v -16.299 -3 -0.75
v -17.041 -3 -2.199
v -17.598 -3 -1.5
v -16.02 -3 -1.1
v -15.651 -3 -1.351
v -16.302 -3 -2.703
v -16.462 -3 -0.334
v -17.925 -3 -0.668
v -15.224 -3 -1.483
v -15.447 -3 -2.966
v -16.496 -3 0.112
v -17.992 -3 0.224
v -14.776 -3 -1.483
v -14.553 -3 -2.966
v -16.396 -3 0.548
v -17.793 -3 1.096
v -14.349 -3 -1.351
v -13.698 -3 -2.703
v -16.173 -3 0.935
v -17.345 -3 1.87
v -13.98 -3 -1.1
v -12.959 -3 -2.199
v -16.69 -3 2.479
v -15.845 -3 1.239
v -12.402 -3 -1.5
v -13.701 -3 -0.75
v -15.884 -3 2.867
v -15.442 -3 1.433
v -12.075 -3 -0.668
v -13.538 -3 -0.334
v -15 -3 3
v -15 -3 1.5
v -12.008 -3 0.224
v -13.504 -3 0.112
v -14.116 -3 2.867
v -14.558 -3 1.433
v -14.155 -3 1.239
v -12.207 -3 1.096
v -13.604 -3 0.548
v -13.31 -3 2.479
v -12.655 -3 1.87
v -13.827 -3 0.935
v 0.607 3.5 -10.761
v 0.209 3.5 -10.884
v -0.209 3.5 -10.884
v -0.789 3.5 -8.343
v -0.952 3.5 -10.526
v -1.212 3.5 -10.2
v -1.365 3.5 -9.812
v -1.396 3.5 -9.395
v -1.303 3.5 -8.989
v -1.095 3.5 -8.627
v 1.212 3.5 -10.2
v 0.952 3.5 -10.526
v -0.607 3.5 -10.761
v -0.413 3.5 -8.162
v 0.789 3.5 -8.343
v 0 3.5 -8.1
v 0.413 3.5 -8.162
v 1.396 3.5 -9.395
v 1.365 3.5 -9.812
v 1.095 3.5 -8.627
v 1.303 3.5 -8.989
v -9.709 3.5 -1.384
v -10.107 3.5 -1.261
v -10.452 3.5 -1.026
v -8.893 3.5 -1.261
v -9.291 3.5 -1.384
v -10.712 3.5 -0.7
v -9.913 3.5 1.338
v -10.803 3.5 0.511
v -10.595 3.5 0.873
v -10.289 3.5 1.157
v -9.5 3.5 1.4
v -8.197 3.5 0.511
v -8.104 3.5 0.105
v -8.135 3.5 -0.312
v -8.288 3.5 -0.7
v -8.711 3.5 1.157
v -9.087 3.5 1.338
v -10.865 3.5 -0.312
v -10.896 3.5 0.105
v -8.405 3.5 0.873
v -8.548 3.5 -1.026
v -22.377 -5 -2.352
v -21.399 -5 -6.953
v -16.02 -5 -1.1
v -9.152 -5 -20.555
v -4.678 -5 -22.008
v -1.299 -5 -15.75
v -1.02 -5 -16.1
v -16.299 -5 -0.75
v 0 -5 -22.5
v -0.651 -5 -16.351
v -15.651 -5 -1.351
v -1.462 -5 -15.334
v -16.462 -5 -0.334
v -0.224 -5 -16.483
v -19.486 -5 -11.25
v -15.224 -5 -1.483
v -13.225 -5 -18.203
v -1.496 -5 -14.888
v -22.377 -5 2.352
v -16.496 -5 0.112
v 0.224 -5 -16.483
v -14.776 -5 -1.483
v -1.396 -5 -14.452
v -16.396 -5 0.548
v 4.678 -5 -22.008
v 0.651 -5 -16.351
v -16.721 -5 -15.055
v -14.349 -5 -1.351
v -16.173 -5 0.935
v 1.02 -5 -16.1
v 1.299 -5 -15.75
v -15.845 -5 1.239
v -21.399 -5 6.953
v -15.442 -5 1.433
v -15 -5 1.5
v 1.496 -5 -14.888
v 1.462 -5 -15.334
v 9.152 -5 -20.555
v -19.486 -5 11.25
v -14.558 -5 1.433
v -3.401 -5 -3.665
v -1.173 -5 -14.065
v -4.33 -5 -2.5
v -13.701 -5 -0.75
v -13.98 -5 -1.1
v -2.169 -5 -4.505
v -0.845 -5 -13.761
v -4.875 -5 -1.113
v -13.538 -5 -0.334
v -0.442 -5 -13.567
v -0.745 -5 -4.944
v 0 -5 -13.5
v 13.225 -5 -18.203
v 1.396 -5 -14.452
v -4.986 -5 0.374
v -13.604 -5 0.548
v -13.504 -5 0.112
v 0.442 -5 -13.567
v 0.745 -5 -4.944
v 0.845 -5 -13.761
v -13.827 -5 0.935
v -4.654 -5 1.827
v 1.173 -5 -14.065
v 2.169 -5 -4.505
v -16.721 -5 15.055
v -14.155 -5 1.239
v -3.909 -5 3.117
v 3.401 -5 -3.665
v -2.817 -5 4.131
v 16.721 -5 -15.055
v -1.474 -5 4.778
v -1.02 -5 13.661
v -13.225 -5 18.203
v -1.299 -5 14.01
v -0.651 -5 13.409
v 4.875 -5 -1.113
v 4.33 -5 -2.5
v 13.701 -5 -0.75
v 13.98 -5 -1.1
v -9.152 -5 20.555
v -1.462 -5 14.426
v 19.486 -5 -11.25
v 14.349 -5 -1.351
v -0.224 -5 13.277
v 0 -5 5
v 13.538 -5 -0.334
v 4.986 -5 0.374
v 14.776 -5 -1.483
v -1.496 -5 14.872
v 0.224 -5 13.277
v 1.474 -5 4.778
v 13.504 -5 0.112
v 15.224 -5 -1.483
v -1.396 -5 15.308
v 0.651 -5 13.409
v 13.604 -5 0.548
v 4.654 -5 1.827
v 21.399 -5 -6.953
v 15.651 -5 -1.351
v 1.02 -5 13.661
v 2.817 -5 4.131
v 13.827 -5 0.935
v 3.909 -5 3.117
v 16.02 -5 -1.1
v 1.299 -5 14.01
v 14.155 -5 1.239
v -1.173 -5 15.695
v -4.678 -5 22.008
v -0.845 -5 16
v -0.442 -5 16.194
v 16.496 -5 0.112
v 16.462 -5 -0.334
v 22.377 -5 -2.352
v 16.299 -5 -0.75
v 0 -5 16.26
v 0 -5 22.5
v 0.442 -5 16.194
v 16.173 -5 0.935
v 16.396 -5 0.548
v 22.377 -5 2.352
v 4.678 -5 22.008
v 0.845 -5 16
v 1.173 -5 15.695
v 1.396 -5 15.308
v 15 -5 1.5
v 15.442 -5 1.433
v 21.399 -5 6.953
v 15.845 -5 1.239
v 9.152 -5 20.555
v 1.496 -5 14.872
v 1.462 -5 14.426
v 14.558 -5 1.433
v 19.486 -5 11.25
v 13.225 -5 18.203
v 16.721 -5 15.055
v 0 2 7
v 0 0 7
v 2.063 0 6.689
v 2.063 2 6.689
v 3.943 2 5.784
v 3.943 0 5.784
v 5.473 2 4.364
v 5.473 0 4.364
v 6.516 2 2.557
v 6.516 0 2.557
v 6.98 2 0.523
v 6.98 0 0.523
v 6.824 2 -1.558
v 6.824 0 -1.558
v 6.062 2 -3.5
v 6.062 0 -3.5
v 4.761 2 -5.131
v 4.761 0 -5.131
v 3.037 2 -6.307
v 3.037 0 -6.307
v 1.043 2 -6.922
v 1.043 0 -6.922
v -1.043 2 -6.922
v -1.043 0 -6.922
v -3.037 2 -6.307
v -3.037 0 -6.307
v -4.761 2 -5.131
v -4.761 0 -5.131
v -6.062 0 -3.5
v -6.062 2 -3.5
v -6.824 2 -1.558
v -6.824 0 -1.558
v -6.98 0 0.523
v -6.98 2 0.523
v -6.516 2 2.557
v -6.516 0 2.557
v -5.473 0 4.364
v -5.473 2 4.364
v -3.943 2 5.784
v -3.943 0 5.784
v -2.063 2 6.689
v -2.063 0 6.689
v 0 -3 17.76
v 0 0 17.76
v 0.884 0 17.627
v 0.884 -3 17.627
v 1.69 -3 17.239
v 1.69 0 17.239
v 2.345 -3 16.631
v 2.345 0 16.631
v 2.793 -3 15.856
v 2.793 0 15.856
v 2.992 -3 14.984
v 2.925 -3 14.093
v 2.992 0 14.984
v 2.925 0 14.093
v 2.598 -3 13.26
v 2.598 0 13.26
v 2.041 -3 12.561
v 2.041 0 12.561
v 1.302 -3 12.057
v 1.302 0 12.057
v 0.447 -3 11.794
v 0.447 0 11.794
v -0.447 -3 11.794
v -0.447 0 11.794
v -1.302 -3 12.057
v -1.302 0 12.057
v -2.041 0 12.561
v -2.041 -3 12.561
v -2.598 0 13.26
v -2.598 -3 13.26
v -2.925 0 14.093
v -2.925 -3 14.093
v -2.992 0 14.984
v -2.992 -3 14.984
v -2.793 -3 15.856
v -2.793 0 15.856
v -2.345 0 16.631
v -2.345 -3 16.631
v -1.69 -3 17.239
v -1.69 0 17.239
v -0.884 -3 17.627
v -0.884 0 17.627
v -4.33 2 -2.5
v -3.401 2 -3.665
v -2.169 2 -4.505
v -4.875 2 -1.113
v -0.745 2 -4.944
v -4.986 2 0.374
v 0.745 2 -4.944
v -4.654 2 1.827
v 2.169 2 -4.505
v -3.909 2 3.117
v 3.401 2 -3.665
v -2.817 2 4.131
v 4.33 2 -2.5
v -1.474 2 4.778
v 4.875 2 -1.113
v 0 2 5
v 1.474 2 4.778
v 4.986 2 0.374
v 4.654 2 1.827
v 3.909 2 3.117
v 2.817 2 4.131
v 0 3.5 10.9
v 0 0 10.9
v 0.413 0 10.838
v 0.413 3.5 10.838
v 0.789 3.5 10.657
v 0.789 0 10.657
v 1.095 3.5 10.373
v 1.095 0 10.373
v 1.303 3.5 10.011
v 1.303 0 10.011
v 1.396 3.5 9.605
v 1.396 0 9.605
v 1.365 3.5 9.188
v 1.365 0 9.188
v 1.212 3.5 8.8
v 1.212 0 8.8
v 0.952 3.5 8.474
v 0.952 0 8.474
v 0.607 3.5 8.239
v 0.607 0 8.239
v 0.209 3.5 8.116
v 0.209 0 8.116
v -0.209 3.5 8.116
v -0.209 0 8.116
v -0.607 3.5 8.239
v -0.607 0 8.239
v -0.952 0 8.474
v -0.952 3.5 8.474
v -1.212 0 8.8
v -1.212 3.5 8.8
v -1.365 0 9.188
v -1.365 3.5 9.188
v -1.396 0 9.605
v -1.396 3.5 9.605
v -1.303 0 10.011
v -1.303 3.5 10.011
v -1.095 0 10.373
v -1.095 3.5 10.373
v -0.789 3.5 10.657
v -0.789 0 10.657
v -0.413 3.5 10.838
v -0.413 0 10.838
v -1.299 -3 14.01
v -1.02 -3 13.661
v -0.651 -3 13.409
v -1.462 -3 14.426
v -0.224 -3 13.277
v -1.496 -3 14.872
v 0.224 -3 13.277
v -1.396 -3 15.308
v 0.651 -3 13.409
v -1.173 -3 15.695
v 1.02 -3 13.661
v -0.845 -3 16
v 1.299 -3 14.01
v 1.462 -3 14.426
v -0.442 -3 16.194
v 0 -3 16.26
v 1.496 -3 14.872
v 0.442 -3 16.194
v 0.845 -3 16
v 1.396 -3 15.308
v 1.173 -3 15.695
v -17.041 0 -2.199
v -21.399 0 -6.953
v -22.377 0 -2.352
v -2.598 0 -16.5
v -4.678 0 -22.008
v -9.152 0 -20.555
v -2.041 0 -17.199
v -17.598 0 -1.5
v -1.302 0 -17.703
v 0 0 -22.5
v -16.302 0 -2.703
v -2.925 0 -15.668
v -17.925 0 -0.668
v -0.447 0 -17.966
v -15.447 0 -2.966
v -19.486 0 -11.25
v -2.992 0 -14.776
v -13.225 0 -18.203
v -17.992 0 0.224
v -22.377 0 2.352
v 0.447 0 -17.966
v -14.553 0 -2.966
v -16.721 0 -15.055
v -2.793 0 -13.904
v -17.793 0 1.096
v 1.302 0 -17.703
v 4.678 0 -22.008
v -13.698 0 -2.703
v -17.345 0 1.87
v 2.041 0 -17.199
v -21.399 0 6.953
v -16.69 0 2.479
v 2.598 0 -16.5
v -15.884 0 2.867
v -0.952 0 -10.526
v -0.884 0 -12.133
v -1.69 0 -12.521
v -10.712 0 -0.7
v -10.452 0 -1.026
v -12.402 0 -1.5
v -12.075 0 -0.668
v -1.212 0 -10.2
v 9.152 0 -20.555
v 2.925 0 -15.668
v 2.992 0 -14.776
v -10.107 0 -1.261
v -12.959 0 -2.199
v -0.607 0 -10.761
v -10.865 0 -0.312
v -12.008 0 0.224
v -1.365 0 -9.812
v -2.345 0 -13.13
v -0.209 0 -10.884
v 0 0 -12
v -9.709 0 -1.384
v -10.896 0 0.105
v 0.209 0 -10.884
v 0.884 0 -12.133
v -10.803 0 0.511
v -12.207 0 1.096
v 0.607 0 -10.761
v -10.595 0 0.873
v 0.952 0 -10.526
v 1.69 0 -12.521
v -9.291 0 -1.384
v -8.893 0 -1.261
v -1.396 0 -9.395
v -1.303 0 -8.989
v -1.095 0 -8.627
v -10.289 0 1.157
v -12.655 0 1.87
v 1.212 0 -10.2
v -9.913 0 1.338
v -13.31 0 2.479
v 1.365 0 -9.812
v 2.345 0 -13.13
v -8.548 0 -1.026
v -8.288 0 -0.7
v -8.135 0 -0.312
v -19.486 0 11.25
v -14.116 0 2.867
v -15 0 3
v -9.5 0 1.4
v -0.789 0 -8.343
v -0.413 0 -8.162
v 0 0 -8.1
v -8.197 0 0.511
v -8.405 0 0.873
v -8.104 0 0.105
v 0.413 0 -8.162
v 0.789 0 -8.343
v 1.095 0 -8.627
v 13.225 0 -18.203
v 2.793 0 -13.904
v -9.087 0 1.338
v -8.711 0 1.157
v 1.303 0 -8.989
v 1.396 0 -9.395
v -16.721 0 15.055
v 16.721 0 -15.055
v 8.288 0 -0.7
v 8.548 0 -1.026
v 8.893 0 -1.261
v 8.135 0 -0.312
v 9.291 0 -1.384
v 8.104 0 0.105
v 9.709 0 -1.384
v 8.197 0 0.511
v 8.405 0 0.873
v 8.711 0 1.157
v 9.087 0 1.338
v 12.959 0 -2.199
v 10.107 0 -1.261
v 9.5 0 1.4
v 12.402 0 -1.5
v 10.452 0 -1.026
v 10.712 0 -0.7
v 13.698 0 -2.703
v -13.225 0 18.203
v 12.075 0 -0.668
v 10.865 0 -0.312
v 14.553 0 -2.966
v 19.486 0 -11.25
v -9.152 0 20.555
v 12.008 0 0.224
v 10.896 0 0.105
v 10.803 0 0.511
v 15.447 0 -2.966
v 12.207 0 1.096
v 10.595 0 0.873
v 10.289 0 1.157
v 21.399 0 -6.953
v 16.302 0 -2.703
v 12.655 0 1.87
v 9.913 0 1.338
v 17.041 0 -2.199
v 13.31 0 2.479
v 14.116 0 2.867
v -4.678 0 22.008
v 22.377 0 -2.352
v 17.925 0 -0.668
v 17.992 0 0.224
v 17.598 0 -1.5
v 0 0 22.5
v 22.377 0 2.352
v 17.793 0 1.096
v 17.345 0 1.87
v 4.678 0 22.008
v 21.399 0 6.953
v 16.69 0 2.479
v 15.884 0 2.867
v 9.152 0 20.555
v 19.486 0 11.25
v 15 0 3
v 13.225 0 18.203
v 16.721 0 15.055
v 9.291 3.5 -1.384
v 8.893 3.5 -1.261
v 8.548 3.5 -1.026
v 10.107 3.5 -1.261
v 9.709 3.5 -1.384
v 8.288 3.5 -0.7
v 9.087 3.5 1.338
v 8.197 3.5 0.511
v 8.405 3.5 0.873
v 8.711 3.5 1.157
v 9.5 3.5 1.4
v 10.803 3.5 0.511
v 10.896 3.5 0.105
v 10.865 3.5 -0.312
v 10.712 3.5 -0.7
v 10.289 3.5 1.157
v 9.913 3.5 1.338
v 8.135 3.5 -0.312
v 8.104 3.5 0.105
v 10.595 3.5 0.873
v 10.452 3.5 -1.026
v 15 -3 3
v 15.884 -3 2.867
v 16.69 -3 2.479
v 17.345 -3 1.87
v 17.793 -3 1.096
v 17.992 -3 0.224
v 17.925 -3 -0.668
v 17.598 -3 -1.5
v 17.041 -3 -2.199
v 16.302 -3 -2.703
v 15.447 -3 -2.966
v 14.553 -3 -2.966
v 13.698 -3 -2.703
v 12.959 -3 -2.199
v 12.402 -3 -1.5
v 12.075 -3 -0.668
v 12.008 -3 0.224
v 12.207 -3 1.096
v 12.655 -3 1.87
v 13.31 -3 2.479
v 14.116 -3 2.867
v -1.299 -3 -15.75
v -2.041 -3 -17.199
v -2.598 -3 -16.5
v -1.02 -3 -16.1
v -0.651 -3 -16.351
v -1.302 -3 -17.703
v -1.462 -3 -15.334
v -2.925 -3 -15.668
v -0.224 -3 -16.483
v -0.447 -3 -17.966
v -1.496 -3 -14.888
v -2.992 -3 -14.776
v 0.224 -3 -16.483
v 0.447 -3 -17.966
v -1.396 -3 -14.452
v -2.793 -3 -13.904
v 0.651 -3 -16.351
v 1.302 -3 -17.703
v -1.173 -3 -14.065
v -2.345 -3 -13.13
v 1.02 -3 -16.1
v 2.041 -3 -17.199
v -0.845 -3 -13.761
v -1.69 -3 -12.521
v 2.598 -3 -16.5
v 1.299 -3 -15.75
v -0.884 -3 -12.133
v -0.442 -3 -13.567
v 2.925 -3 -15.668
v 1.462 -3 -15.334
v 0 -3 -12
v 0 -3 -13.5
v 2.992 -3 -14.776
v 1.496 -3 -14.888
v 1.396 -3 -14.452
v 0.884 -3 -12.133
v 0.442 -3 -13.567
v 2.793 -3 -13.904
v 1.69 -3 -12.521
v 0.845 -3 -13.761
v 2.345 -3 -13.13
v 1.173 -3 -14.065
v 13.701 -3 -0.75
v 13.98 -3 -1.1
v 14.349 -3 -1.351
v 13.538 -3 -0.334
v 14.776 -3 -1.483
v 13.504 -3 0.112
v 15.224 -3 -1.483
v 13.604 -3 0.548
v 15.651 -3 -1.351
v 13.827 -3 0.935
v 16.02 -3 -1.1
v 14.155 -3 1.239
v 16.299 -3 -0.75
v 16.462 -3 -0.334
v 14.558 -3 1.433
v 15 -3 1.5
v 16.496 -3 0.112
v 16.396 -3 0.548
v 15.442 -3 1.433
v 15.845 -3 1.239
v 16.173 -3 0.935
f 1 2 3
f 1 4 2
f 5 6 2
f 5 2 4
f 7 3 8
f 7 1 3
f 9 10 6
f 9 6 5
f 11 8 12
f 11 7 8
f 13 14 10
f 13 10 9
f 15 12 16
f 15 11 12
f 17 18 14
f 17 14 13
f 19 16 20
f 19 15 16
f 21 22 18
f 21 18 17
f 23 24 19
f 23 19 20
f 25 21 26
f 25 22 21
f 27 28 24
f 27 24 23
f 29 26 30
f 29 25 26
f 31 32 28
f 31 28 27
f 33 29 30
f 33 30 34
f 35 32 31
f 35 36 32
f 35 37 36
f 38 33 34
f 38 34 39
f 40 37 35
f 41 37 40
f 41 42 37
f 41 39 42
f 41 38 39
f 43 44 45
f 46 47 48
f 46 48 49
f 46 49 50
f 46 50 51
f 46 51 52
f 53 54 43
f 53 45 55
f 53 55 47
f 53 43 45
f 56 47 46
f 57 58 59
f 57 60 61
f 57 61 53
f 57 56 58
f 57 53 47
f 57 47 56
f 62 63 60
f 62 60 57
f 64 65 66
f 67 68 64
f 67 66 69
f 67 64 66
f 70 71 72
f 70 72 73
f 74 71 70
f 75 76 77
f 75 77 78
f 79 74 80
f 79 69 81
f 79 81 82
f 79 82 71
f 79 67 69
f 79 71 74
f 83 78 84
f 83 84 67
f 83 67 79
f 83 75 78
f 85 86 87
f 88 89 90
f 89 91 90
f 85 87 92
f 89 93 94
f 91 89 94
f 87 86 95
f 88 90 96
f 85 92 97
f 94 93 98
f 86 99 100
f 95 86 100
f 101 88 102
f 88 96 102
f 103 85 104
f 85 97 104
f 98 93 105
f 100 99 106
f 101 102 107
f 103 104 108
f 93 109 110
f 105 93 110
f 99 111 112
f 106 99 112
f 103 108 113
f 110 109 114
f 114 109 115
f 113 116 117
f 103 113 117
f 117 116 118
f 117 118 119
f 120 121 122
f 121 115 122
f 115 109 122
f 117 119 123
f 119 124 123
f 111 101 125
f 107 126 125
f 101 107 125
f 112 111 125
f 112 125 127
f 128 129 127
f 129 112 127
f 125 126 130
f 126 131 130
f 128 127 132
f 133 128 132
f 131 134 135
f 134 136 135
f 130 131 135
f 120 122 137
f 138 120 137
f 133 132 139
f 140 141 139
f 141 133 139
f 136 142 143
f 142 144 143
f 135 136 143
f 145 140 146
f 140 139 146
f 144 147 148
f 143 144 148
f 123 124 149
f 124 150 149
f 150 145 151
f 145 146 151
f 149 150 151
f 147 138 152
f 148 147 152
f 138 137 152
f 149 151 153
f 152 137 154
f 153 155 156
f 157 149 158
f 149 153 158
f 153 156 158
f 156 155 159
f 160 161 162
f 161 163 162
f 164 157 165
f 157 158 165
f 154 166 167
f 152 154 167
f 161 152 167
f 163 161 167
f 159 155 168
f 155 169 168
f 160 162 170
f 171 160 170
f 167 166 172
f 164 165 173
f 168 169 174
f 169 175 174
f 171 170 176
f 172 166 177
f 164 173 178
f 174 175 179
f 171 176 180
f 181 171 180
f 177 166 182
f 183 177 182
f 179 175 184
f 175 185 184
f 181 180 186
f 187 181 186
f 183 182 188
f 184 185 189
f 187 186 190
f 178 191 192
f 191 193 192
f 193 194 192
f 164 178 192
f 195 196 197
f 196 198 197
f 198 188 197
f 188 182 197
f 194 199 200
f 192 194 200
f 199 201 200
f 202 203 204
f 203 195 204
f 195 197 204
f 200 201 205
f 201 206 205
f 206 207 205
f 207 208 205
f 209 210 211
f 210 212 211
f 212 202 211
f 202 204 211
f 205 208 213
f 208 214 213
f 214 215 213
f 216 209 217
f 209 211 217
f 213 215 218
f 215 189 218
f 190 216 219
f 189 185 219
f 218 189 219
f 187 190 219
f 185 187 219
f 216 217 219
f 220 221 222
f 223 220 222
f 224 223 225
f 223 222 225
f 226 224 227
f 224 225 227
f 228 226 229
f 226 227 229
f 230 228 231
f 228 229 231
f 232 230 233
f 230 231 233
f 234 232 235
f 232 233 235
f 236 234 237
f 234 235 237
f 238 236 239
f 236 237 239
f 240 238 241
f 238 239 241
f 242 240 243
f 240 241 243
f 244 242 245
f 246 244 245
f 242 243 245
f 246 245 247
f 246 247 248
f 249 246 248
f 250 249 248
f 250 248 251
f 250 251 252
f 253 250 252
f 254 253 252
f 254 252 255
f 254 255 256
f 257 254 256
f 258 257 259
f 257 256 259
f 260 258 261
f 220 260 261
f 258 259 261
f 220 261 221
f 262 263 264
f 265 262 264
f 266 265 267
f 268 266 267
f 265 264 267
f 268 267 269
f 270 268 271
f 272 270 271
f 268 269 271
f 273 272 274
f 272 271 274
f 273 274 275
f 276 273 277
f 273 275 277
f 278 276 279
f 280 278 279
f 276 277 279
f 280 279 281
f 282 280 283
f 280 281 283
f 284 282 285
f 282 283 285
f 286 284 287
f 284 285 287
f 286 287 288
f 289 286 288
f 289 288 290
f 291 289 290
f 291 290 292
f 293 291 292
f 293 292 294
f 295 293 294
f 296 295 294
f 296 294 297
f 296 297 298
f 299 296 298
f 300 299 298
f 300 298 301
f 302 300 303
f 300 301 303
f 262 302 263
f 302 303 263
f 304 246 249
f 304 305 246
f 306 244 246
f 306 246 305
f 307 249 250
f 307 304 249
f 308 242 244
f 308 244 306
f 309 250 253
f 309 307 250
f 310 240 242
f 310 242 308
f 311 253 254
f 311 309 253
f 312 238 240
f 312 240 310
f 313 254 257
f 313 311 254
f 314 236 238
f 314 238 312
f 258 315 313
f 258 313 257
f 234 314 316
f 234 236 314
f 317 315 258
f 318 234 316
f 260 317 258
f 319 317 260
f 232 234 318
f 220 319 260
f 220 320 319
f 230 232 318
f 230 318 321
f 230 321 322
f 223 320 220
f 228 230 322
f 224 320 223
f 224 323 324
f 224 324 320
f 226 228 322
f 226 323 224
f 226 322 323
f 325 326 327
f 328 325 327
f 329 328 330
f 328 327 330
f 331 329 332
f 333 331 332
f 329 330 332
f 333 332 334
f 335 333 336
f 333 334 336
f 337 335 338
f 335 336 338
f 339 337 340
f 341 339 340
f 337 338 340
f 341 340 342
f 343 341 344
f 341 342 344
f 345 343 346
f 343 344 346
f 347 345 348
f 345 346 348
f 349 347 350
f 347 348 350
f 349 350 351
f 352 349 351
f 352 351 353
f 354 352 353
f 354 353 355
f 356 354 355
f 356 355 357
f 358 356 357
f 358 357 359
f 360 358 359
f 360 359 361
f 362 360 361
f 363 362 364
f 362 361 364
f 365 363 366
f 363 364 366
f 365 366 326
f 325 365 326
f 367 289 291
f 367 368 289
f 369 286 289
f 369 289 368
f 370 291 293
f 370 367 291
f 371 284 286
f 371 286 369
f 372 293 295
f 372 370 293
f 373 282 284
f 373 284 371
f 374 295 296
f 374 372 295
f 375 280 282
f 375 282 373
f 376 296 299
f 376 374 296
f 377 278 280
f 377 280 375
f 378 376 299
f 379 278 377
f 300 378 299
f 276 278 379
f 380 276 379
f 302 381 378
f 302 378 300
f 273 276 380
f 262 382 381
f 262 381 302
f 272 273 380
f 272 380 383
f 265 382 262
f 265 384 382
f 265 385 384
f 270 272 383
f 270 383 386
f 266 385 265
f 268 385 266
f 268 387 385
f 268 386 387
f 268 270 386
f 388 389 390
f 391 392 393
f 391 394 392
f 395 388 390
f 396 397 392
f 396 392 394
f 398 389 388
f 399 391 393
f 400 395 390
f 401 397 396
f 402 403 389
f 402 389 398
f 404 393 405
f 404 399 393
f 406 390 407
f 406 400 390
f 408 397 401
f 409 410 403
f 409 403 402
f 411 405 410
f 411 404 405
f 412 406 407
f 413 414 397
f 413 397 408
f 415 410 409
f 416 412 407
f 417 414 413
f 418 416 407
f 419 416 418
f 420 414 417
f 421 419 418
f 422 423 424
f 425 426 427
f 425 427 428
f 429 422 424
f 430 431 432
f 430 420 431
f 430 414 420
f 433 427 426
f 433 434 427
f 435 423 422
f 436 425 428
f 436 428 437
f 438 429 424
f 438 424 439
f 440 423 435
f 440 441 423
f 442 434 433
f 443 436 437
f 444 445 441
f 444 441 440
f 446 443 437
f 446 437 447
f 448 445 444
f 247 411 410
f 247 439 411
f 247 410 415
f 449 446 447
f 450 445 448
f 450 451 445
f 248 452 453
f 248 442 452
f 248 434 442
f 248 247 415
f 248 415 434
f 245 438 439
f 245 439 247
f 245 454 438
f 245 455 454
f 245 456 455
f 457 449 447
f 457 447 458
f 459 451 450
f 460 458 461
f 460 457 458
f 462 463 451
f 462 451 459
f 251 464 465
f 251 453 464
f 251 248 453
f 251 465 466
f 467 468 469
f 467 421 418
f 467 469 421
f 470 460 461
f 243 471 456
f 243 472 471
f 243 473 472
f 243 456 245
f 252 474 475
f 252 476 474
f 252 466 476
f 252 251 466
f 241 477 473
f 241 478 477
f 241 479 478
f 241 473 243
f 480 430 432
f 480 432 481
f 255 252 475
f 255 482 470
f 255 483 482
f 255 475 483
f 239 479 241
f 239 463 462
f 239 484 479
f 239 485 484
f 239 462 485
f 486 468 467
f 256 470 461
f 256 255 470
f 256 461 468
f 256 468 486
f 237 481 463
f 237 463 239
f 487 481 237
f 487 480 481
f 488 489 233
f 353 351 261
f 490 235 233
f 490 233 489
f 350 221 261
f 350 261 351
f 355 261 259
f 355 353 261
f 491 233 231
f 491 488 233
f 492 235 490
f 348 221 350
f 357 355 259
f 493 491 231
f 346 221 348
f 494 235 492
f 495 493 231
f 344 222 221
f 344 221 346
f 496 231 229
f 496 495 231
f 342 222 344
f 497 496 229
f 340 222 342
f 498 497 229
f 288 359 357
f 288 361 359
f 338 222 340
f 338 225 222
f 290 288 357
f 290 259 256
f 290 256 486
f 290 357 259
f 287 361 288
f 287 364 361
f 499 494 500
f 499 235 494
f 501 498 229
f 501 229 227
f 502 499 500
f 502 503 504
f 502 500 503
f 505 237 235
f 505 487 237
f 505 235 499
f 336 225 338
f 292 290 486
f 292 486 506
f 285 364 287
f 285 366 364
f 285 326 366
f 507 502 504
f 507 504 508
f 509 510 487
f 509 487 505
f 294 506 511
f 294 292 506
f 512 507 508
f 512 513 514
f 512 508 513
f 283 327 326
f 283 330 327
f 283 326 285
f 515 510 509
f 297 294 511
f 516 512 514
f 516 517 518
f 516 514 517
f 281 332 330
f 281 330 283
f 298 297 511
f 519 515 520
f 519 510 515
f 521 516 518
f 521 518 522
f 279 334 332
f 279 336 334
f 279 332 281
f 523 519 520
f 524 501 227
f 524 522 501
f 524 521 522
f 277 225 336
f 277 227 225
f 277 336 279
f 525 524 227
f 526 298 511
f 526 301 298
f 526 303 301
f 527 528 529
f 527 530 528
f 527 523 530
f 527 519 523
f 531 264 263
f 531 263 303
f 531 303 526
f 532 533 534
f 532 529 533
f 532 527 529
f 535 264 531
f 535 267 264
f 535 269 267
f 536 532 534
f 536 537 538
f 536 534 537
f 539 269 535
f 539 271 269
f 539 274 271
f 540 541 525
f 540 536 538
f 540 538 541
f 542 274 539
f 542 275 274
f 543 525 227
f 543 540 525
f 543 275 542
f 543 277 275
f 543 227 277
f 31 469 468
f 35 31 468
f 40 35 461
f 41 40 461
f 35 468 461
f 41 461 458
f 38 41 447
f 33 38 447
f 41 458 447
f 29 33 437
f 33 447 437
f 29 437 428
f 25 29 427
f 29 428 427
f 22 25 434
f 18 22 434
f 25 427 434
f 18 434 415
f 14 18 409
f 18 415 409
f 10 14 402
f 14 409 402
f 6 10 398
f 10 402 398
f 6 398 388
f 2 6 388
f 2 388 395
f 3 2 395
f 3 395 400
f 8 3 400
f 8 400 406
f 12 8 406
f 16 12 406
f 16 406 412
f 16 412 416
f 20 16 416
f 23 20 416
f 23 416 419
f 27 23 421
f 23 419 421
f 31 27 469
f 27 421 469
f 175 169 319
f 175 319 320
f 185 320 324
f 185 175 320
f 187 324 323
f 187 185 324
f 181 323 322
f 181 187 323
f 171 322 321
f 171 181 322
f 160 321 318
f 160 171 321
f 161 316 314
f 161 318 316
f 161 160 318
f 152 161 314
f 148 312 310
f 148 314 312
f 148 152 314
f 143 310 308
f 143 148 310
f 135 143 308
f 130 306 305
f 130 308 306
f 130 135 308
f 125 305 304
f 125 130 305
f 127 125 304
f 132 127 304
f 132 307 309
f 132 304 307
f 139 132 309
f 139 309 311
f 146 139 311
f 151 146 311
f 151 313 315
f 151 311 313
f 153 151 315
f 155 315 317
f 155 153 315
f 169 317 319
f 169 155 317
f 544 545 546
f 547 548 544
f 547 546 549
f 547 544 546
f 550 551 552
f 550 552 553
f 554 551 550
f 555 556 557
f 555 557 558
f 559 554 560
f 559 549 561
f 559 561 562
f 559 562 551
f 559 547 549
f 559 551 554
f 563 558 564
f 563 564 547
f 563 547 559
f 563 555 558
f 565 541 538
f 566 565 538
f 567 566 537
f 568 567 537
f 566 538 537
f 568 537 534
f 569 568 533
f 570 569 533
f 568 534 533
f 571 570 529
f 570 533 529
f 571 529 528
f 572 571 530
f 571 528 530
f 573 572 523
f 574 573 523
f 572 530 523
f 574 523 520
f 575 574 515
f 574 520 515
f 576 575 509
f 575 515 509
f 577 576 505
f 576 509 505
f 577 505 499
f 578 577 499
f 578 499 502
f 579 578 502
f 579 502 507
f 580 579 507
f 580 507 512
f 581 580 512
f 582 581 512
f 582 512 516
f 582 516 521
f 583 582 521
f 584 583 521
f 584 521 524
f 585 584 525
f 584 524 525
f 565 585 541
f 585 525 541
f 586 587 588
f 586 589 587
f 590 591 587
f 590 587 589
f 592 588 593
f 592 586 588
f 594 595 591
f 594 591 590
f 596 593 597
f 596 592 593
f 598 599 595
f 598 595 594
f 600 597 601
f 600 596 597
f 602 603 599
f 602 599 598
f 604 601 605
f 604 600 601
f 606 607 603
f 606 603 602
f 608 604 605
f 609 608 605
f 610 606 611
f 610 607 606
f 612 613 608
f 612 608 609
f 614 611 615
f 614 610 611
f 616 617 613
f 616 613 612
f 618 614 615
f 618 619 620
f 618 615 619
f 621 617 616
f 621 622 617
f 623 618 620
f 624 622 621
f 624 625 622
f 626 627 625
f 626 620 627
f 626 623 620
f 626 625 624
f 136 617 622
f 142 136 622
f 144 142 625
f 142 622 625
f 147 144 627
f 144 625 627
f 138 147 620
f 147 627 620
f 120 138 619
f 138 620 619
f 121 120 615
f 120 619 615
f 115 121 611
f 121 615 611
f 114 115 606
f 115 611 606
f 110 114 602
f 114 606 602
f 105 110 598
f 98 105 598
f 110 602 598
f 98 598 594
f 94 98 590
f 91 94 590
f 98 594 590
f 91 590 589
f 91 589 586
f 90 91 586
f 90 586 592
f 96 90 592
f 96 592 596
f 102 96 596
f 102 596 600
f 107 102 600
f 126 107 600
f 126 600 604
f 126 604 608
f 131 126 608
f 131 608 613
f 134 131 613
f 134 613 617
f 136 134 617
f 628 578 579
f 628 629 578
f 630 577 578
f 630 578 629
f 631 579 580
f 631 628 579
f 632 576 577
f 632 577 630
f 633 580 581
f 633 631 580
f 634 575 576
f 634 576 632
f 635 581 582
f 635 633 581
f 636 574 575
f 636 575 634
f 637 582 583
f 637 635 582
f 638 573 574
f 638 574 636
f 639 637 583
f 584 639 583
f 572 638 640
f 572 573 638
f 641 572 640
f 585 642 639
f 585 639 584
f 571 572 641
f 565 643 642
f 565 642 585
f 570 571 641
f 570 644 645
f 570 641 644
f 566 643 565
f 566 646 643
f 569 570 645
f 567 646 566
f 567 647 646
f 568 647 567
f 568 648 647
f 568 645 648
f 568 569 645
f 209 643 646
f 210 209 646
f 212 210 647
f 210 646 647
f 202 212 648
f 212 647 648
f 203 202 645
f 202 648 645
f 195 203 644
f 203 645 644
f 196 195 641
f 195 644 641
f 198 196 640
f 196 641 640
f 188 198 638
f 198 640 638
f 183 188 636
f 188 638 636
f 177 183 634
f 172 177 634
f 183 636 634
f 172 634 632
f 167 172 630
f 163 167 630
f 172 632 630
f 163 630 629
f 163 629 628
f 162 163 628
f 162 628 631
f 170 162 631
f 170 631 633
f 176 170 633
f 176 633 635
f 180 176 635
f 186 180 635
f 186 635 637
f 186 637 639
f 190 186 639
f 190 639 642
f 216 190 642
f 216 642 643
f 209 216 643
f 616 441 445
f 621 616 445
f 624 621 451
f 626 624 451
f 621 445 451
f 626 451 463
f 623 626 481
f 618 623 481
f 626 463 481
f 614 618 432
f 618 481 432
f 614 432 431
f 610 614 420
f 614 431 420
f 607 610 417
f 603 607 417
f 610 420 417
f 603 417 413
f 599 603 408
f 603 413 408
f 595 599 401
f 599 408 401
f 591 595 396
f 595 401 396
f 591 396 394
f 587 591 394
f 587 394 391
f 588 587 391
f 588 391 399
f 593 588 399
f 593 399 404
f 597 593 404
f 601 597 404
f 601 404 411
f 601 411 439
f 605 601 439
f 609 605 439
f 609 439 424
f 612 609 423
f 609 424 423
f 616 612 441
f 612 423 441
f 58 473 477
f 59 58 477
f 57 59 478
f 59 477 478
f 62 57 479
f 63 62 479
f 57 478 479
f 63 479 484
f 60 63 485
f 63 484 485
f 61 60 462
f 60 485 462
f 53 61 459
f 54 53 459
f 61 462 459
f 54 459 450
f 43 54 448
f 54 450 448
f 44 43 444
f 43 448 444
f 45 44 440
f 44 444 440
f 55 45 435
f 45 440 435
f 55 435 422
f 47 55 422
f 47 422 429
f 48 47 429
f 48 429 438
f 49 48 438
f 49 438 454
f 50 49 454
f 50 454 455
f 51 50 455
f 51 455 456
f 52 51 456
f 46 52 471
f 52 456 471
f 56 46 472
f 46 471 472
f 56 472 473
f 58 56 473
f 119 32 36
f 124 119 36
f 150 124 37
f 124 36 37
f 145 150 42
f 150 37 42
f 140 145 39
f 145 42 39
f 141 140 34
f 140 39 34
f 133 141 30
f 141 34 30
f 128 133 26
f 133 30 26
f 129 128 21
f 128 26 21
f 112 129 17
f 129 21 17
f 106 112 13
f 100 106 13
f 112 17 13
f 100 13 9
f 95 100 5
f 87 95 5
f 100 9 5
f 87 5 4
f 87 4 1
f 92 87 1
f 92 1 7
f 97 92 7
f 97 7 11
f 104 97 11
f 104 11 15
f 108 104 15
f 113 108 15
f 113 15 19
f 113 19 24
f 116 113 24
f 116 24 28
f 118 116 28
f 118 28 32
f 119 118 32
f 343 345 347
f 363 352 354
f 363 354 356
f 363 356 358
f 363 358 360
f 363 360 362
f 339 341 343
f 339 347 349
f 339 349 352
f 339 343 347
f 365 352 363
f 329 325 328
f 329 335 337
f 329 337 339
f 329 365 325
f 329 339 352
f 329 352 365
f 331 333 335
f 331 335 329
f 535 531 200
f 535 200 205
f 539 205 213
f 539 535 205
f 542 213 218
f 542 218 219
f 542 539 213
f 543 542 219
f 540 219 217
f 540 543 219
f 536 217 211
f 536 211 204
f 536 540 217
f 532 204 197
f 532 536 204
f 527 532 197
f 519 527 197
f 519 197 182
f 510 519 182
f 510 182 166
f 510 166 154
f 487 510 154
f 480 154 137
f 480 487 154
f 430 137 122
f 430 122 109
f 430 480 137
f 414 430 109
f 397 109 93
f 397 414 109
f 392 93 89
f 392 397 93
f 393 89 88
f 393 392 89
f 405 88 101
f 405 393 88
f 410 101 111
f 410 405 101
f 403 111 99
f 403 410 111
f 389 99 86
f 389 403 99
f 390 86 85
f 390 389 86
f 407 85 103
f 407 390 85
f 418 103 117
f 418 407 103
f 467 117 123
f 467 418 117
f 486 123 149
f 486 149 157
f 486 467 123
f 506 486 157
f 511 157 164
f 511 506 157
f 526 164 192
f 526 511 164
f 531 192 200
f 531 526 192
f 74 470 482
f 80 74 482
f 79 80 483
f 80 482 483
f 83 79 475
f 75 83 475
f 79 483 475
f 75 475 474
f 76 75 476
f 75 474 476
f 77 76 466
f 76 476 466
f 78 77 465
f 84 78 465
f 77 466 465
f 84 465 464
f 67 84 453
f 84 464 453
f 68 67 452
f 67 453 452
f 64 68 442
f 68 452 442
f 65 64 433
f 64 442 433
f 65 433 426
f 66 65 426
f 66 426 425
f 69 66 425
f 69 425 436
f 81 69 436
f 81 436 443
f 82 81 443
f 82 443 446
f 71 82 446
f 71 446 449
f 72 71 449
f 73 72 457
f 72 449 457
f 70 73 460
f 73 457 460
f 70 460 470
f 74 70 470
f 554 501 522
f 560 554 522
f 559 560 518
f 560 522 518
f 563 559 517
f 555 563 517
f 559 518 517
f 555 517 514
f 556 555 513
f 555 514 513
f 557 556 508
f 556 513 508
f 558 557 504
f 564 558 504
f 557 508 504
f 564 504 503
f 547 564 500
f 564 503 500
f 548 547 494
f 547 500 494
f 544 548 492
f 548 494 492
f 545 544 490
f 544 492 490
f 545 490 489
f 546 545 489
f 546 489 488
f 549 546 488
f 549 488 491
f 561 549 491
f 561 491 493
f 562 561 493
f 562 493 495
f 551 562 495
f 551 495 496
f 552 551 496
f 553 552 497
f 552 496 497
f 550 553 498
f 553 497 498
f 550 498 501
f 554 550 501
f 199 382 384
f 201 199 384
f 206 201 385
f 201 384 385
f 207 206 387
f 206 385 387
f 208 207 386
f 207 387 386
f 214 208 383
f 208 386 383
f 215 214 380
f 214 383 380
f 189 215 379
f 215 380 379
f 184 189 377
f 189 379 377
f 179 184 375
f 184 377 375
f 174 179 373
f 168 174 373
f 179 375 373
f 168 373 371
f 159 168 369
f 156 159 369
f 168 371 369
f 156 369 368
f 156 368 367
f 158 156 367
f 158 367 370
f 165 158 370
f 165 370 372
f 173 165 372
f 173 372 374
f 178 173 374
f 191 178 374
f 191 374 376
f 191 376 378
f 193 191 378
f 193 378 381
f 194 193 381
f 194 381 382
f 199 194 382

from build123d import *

# Parameters (mm, degrees)
SKETCH_1_R               = 22.5
EXTRUDE_2_DEPTH          = 5
SKETCH_5_R               = 1.5
CUT_EXTRUDE_2_DEPTH      = 11
SKETCH_6_R               = 3
CUT_EXTRUDE_3_DEPTH      = 3
SKETCH_9_R               = 1.4
EXTRUDE_5_DEPTH          = 3.5
SKETCH_10_R              = 7
EXTRUDE_6_DEPTH          = 2
CUT_EXTRUDE_4_DEPTH      = 14
CUT_EXTRUDE_4_DEPTH_BACK = 14
SKETCH_11_R              = 5


with BuildPart() as part:
    # 草图1 → 凸台-拉伸2 (new body)
    with BuildSketch(Plane(origin=(0, 0, 0), x_dir=(1, 0, 0), z_dir=(0, 1, 0))):
        with Locations(Location((0, 0, 0), (0, 0, 270))):
            Circle(SKETCH_1_R)
    extrude(amount=-EXTRUDE_2_DEPTH)

    # 草图5 → 切除-拉伸2 (cut)
    with BuildSketch(Plane(origin=(0, 0, 0), x_dir=(1, 0, 0), z_dir=(0, 1, 0))):
        with Locations(Location((0, 15, 0), (0, 0, 270))):
            Circle(SKETCH_5_R)
        with Locations(Location((15, 0, 0), (0, 0, 270))):
            Circle(SKETCH_5_R)
        with Locations(Location((0, -14.760226484, 0), (0, 0, 270))):
            Circle(SKETCH_5_R)
        with Locations(Location((-15, 0, 0), (0, 0, 270))):
            Circle(SKETCH_5_R)
    extrude(amount=-CUT_EXTRUDE_2_DEPTH, mode=Mode.SUBTRACT)

    # 草图6 → 切除-拉伸3 (cut)
    with BuildSketch(Plane(origin=(0, 0, 0), x_dir=(1, 0, 0), z_dir=(0, 1, 0))):
        with Locations(Location((0, 15, 0), (0, 0, 270))):
            Circle(SKETCH_6_R)
        with Locations(Location((15, 0, 0), (0, 0, 270))):
            Circle(SKETCH_6_R)
        with Locations(Location((0, -14.760226484, 0), (0, 0, 270))):
            Circle(SKETCH_6_R)
        with Locations(Location((-15, 0, 0), (0, 0, 270))):
            Circle(SKETCH_6_R)
    extrude(amount=-CUT_EXTRUDE_3_DEPTH, mode=Mode.SUBTRACT)

    # 草图9 → 凸台-拉伸5 (add)
    with BuildSketch(Plane(origin=(0, 0, 0), x_dir=(1, 0, 0), z_dir=(0, 1, 0))):
        with Locations(Location((0, 9.5, 0), (0, 0, 270))):
            Circle(SKETCH_9_R)
        with Locations(Location((9.5, 0, 0), (0, 0, 270))):
            Circle(SKETCH_9_R)
        with Locations(Location((0, -9.5, 0), (0, 0, 270))):
            Circle(SKETCH_9_R)
        with Locations(Location((-9.5, 0, 0), (0, 0, 270))):
            Circle(SKETCH_9_R)
    extrude(amount=EXTRUDE_5_DEPTH)

    # 草图10 → 凸台-拉伸6 (add)
    with BuildSketch(Plane(origin=(0, 0, 0), x_dir=(1, 0, 0), z_dir=(0, 1, 0))):
        with Locations(Location((0, 0, 0), (0, 0, 270))):
            Circle(SKETCH_10_R)
    extrude(amount=EXTRUDE_6_DEPTH)

    # 草图11 → 切除-拉伸4 (cut, two sides: drawn at the far end of the back side and taken through both)
    with BuildSketch(Plane(origin=(0, 0, 0), x_dir=(1, 0, 0), z_dir=(0, 1, 0)).offset(-CUT_EXTRUDE_4_DEPTH_BACK)):
        with Locations(Location((0, 0, 0), (0, 0, 270))):
            Circle(SKETCH_11_R)
    extrude(amount=CUT_EXTRUDE_4_DEPTH + CUT_EXTRUDE_4_DEPTH_BACK, mode=Mode.SUBTRACT)


solid = part.part
